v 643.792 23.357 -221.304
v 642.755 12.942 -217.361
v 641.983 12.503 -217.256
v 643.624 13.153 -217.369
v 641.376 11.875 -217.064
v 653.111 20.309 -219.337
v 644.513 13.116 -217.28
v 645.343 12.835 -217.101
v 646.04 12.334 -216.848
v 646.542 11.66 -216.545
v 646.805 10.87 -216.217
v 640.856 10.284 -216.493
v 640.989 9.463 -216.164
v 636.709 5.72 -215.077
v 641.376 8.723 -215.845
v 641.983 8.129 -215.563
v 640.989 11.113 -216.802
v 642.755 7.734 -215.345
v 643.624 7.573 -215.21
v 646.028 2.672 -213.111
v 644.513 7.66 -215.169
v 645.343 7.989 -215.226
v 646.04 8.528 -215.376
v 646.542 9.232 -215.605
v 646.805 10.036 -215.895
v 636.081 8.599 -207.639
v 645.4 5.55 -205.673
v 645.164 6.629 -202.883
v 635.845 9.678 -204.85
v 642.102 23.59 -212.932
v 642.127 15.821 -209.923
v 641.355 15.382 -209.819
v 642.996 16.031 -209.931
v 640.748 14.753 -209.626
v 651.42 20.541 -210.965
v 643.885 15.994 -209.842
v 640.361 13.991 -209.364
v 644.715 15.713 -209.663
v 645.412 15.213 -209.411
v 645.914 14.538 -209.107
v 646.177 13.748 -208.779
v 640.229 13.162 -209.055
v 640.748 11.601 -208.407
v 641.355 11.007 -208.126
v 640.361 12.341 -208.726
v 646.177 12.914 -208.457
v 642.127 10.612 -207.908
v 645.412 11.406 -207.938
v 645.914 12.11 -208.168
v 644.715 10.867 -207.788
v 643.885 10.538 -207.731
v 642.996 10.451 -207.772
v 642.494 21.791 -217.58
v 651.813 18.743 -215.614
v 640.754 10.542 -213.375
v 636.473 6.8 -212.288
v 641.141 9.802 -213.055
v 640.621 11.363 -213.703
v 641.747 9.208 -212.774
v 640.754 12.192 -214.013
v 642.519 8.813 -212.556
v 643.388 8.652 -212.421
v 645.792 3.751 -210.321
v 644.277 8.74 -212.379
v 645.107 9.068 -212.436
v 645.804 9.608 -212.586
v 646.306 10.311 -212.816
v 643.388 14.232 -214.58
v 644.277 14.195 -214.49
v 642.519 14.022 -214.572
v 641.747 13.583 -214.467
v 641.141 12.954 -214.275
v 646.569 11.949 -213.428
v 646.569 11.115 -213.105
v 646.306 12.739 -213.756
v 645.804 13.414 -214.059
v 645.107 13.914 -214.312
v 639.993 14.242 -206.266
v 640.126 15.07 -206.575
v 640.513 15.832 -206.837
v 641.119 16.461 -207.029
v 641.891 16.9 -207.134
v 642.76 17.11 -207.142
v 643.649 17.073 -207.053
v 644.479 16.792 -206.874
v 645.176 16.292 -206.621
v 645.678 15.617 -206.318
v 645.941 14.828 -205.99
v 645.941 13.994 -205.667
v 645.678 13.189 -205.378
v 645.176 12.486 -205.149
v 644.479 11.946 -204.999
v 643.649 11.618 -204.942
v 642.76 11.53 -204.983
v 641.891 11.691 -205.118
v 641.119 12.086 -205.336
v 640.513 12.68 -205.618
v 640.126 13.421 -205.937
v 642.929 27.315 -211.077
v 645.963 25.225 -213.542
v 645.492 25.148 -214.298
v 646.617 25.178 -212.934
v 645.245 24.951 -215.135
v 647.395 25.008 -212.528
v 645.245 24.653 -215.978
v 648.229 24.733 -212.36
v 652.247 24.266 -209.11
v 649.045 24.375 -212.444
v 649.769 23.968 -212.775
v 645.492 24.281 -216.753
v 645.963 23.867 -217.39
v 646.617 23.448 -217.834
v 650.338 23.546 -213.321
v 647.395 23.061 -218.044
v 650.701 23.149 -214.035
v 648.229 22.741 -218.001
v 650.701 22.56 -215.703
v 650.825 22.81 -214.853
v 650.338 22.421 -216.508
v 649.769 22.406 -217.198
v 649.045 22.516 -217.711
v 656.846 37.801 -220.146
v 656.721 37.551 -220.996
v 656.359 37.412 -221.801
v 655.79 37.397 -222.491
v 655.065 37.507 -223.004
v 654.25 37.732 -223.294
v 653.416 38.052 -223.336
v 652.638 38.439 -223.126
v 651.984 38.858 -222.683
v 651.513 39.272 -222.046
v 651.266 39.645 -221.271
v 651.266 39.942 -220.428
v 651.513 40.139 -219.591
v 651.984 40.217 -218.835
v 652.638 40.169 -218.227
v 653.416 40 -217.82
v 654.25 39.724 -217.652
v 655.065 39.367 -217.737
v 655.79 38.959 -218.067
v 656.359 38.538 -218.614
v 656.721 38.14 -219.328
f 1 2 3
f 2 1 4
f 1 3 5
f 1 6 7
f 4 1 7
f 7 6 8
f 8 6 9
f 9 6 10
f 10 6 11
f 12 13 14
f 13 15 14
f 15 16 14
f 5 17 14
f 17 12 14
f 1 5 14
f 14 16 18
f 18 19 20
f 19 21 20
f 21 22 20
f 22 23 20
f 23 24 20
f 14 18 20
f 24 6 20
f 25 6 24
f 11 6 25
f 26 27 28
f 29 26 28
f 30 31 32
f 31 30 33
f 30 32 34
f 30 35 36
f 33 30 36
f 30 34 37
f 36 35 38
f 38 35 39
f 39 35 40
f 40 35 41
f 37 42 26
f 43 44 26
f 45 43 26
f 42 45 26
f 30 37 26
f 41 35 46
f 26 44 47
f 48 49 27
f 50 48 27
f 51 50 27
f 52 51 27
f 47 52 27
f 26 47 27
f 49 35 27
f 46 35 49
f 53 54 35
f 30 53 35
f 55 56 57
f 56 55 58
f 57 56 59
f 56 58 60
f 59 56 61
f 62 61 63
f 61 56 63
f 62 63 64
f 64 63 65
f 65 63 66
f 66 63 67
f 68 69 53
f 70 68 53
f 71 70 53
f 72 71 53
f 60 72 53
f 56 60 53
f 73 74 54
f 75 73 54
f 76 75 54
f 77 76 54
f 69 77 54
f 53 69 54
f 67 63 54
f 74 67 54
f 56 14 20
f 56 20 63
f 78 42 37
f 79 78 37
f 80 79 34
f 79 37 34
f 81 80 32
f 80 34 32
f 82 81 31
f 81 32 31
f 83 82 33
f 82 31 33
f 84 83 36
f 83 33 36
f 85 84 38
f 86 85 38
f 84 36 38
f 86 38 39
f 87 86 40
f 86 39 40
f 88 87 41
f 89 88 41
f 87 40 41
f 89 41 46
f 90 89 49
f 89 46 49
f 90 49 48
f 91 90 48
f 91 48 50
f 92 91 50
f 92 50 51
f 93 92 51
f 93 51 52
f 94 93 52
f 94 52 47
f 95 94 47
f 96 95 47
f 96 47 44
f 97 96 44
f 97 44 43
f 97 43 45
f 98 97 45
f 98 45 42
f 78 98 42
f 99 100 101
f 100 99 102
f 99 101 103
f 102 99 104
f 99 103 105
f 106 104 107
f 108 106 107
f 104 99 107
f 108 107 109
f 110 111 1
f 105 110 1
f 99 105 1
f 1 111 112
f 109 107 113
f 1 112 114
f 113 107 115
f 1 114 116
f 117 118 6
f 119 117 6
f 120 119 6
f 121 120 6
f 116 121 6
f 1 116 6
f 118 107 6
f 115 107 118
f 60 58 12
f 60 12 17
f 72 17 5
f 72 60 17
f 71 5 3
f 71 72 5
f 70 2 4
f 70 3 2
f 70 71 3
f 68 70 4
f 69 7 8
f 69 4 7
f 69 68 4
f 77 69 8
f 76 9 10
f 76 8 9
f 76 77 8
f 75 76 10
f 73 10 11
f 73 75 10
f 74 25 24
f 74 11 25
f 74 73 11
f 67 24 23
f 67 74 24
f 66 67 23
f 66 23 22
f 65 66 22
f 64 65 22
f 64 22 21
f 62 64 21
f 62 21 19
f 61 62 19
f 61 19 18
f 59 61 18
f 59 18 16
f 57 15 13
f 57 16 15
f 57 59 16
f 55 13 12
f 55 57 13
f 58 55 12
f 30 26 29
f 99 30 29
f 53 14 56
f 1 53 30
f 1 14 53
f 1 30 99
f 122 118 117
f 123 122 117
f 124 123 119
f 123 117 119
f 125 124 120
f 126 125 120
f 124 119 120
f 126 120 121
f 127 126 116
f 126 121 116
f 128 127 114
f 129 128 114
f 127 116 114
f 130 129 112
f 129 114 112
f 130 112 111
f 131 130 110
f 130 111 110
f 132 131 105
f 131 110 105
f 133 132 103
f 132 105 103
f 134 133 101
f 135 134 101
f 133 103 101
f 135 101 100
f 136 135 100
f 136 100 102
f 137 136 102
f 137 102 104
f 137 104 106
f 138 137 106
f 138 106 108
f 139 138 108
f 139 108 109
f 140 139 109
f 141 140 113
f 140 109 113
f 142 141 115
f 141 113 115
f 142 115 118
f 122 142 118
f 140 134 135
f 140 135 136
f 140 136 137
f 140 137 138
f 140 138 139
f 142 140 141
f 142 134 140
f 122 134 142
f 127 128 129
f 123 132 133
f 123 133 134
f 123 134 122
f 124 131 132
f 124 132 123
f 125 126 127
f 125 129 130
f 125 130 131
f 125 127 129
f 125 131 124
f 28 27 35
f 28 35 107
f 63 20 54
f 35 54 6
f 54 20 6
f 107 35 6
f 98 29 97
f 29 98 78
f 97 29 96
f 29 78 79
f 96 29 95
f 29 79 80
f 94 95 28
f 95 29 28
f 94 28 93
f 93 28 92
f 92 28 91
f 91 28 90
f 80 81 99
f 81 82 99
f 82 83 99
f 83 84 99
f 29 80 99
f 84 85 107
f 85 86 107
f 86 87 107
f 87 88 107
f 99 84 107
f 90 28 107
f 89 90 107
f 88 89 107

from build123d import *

# Parameters (mm, degrees)
BOSS_EXTRUDE1_DEPTH     = 10
SKETCH3_R               = 3
CUT_EXTRUDE1_DEPTH      = 17.173315528
CUT_EXTRUDE1_DEPTH_BACK = 12.173315528
SKETCH4_R               = 3
BOSS_EXTRUDE2_DEPTH     = 17


with BuildPart() as part:
    # Sketch2 → Boss-Extrude1 (new body)
    with BuildSketch(Plane(origin=(707.562217201, 137.847000427, -295.175758868), x_dir=(0.354162423, 0.881836565, -0.311341051), z_dir=(-0.931884805, 0.304841472, -0.196627535))):
        Polygon((-166.545846492, -35.496085413), (-149.545846492, -35.496085413), (-149.545846492, -40.496085413), (-166.545846492, -40.496085413), (-166.545846492, -43.496085413), (-146.545846492, -43.496085413), (-146.545846492, -32.496085413), (-166.545846492, -32.496085413), align=None)
    extrude(amount=BOSS_EXTRUDE1_DEPTH)

    # Sketch3 → Cut-Extrude1 (cut, two sides)
    with BuildSketch(Plane(origin=(18.826454002, -86.301151934, -223.021951761), x_dir=(-0.996915398, -0.028323606, -0.073194688), z_dir=(0.078483686, -0.359772079, -0.92973349))) as cut_extrude1_sk:
        with Locations((-626.324876441, 87.720012572)):
            Circle(SKETCH3_R)
    extrude(amount=CUT_EXTRUDE1_DEPTH, mode=Mode.SUBTRACT)
    extrude(cut_extrude1_sk.sketch, amount=-CUT_EXTRUDE1_DEPTH_BACK, mode=Mode.SUBTRACT)

    # Sketch4 → Boss-Extrude2 (add)
    with BuildSketch(Plane(origin=(112.448325625, 279.987482676, -98.852327665), x_dir=(0.935183927, -0.333959305, 0.117907609), z_dir=(0.354162423, 0.881836565, -0.311341051))):
        with Locations((572.690940182, 195.003128109)):
            Circle(SKETCH4_R)
    extrude(amount=BOSS_EXTRUDE2_DEPTH)


solid = part.part
